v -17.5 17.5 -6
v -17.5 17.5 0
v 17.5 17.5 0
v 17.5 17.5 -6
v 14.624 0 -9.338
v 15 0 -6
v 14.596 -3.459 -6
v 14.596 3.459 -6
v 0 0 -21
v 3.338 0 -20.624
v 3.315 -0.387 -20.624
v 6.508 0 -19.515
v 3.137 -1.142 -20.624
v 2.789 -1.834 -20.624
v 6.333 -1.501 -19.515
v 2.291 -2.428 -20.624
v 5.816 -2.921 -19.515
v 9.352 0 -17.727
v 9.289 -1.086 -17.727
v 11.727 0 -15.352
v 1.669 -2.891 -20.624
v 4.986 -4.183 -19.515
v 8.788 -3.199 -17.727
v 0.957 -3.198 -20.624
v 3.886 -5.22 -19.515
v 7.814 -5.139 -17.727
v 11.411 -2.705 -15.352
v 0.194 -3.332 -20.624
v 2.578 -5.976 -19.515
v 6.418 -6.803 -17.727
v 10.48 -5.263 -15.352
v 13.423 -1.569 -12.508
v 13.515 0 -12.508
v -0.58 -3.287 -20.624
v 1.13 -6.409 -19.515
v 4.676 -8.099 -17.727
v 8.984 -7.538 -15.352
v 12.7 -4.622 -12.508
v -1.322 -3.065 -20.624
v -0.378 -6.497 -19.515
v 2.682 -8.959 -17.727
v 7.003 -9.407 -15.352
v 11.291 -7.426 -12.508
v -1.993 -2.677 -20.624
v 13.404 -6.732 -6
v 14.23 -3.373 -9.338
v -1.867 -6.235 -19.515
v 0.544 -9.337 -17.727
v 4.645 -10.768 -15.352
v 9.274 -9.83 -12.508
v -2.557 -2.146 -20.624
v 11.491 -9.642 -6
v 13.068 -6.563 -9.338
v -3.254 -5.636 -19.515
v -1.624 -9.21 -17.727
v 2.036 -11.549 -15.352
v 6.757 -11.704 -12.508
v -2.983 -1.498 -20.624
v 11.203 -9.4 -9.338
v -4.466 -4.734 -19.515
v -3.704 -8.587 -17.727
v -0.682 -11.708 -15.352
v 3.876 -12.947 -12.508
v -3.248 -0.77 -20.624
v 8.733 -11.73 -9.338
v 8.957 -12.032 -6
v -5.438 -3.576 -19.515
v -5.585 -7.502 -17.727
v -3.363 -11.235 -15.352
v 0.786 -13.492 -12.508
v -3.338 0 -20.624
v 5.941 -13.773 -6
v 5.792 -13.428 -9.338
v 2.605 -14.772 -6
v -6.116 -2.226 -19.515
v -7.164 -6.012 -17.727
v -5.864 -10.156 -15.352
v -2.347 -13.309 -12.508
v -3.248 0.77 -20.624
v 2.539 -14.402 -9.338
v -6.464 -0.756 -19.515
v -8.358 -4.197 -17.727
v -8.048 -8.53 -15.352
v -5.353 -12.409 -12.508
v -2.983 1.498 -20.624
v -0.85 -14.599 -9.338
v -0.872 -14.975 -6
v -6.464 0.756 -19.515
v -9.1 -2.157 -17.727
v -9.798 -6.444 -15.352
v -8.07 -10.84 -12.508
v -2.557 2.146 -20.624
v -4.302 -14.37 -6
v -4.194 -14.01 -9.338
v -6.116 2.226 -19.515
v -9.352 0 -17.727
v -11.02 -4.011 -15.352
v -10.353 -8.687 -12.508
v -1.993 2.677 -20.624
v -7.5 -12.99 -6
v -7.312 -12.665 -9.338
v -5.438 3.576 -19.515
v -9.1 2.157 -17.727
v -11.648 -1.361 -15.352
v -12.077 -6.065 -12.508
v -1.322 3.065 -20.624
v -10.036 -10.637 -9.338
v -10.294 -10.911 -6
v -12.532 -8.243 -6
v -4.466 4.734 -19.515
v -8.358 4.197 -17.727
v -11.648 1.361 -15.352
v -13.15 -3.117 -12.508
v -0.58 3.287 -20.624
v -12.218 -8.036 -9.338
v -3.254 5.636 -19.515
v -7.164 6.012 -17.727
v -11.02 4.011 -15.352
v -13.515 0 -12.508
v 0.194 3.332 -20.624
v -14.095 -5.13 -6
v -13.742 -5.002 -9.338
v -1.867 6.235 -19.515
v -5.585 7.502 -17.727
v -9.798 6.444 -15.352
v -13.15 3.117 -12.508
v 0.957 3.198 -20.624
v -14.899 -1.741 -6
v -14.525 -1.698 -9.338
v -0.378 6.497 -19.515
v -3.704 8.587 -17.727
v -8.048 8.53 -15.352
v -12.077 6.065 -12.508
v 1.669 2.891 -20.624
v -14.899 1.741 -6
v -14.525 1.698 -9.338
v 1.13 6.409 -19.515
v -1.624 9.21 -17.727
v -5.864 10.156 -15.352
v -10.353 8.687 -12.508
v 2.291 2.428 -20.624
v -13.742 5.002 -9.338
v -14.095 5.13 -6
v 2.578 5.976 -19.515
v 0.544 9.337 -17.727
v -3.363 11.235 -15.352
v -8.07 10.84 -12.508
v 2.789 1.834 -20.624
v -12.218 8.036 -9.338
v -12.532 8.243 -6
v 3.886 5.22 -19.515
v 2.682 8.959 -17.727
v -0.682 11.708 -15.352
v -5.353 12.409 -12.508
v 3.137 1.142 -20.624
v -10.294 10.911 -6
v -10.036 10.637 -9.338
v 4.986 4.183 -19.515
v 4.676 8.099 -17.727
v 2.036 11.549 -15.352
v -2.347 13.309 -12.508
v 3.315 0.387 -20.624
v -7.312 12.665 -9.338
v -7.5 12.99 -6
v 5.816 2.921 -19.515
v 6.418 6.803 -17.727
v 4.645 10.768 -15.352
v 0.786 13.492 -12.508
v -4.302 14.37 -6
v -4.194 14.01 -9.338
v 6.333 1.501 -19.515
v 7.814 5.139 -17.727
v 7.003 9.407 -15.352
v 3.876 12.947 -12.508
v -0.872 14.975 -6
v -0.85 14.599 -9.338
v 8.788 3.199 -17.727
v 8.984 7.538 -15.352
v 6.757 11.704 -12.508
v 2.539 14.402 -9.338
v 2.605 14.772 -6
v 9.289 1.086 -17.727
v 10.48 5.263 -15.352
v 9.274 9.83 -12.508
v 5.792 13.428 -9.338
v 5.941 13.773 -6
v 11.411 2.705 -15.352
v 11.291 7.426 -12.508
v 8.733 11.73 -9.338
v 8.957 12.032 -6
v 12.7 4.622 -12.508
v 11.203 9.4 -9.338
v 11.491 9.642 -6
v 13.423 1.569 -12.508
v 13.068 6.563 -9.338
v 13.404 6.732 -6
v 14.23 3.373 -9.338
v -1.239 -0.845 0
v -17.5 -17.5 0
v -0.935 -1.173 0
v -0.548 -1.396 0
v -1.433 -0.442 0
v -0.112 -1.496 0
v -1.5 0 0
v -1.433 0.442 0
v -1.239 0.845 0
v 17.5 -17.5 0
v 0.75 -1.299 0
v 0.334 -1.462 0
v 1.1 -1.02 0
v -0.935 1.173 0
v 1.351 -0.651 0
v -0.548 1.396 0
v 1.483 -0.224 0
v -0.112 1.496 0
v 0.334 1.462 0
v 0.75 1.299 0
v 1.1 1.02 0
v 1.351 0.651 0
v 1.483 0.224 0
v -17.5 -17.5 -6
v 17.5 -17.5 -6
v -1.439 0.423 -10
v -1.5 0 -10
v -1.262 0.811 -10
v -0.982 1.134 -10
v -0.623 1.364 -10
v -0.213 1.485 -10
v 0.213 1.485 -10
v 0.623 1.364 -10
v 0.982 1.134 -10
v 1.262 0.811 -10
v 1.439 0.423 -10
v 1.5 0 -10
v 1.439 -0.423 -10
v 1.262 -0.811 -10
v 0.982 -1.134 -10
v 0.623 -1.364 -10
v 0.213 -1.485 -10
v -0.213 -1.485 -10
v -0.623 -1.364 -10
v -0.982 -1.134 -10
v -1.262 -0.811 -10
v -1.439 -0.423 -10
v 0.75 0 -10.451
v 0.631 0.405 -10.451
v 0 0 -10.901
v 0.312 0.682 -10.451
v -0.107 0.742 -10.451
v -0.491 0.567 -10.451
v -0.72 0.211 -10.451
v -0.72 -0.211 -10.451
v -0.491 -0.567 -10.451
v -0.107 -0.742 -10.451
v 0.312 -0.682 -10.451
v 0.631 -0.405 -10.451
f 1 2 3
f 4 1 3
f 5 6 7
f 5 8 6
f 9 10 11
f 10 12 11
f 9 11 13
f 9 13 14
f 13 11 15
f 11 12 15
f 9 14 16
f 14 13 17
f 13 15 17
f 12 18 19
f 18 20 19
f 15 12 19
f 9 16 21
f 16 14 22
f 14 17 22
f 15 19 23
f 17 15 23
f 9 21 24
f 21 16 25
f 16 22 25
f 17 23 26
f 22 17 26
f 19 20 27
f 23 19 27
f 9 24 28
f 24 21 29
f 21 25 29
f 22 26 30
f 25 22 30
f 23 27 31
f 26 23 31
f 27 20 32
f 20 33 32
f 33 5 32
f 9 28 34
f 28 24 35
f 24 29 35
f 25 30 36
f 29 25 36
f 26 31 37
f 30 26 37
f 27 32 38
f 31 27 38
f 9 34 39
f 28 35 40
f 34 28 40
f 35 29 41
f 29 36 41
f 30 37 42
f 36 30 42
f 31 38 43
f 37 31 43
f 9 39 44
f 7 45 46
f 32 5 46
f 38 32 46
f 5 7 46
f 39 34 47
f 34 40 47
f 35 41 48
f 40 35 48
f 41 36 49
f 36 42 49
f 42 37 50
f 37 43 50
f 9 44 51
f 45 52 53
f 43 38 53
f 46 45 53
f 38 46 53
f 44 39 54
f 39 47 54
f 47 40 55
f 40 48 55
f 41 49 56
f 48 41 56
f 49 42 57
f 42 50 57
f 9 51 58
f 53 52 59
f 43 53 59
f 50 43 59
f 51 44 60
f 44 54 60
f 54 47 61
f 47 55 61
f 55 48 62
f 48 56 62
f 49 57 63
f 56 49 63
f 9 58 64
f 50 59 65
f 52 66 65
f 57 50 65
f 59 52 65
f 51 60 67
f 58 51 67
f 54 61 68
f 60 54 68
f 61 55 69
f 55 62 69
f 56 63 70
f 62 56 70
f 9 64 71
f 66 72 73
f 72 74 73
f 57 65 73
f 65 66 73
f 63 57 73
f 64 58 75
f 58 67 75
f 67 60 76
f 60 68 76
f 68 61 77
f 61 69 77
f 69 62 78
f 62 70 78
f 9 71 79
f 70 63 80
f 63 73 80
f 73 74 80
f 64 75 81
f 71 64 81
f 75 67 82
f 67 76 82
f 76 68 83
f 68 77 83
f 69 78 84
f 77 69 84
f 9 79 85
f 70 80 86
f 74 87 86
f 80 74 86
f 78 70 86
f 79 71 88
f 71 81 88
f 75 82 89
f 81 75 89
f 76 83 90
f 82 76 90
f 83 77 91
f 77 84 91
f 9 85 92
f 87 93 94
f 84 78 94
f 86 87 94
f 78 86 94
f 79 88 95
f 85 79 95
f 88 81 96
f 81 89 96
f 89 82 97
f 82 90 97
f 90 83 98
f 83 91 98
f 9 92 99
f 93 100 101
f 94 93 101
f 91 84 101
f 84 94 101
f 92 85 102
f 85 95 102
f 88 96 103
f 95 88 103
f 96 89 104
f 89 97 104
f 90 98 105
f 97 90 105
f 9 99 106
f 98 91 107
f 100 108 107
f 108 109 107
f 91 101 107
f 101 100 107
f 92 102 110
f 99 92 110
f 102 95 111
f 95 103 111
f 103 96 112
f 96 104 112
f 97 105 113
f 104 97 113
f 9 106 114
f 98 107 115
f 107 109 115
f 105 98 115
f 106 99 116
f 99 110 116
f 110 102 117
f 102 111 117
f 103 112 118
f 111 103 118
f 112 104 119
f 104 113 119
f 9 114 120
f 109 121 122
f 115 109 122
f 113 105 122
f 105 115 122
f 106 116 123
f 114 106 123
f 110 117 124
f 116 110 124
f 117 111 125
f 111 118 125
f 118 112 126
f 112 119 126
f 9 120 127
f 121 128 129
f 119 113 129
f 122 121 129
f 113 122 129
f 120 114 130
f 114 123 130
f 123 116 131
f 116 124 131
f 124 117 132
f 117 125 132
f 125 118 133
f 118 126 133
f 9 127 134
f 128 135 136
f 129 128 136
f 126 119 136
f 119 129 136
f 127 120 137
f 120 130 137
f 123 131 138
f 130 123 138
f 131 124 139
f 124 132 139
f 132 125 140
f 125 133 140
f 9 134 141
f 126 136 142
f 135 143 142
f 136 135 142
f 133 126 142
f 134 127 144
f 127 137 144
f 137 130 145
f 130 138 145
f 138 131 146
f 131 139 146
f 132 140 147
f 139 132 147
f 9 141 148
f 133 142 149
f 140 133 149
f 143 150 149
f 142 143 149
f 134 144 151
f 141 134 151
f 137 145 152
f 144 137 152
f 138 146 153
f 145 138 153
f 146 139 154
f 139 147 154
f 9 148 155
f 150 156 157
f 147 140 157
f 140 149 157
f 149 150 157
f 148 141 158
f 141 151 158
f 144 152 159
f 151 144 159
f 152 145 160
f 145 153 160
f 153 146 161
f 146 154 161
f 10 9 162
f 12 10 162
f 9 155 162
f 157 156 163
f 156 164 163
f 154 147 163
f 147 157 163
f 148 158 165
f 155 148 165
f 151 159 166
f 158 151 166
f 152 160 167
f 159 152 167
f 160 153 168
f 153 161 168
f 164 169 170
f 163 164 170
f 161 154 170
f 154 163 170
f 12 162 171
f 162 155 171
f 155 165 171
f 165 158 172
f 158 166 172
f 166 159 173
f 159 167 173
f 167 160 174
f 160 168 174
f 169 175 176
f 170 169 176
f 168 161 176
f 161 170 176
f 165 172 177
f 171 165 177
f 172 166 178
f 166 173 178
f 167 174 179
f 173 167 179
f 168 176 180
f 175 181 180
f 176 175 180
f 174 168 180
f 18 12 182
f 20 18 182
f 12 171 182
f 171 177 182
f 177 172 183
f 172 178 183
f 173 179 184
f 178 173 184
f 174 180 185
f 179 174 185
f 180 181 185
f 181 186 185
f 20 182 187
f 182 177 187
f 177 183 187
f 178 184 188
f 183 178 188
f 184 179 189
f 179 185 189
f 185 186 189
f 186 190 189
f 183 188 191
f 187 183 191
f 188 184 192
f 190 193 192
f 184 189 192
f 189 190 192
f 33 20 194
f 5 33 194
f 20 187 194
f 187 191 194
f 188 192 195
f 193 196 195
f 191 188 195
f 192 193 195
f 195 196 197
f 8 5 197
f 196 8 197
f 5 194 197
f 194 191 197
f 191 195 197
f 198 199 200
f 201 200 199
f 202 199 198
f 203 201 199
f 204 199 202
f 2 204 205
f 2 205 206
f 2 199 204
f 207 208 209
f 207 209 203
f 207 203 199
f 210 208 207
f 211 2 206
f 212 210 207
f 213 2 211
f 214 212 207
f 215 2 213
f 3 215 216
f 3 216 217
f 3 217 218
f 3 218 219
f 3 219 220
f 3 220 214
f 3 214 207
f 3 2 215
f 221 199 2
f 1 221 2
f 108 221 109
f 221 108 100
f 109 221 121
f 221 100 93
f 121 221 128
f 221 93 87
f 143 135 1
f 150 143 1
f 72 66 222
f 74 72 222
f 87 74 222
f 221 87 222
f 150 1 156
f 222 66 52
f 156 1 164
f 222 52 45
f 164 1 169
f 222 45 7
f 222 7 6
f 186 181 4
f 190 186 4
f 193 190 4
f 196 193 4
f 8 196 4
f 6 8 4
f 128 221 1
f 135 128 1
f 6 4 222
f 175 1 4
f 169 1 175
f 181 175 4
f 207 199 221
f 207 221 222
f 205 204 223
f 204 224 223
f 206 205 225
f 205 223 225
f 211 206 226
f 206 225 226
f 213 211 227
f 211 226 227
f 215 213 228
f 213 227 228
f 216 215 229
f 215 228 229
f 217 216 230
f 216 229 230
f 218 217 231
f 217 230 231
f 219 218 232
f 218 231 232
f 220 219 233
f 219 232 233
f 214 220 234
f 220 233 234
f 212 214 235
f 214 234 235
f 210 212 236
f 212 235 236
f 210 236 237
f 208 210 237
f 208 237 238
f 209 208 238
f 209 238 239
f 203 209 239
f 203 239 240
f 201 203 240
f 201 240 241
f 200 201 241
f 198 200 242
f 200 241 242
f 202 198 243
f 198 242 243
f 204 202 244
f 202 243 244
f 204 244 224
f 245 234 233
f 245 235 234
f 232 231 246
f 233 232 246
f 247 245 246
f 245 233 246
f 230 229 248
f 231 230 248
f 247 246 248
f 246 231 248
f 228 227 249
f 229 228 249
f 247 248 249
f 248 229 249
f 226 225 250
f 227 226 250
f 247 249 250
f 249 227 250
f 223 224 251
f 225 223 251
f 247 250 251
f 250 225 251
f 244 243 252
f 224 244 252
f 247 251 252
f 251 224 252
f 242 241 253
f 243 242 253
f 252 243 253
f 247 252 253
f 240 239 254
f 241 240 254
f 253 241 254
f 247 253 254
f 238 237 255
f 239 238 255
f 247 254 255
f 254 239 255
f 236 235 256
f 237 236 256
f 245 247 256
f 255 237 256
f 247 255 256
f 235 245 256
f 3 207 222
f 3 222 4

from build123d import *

# Parameters (mm, degrees)
F0_W     = 35
F0_H     = 35
F1_DEPTH = 6
F4_D     = 3
F4_DEPTH = 10
F4_TIP   = 0.9012909285


with BuildPart() as f1:
    # F0 (on Top) → F1 (new body)
    with BuildSketch(Plane.XY):
        Rectangle(F0_W, F0_H)
    extrude(amount=-F1_DEPTH)

    # F2 (on Front) → F3 (revolve)
    with BuildSketch(Plane.XZ):
        with BuildLine():
            Line((0, -6), (0, -21))
            ThreePointArc((0, -21), (10.6066017178, -16.6066017178), (15, -6))
            Line((15, -6), (0, -6))
        make_face()
    revolve(axis=Axis((0, 0, -13.5), (0, 0, -1)))

    # F4
    with Locations(Plane.XY):
        with Locations((0, 0)):
            Hole(F4_D / 2, depth=F4_DEPTH)
            with Locations((0, 0, -(F4_DEPTH + F4_TIP / 2))):  # 118° drill point
                Cone(0, F4_D / 2, F4_TIP, mode=Mode.SUBTRACT)


solid = f1.part
